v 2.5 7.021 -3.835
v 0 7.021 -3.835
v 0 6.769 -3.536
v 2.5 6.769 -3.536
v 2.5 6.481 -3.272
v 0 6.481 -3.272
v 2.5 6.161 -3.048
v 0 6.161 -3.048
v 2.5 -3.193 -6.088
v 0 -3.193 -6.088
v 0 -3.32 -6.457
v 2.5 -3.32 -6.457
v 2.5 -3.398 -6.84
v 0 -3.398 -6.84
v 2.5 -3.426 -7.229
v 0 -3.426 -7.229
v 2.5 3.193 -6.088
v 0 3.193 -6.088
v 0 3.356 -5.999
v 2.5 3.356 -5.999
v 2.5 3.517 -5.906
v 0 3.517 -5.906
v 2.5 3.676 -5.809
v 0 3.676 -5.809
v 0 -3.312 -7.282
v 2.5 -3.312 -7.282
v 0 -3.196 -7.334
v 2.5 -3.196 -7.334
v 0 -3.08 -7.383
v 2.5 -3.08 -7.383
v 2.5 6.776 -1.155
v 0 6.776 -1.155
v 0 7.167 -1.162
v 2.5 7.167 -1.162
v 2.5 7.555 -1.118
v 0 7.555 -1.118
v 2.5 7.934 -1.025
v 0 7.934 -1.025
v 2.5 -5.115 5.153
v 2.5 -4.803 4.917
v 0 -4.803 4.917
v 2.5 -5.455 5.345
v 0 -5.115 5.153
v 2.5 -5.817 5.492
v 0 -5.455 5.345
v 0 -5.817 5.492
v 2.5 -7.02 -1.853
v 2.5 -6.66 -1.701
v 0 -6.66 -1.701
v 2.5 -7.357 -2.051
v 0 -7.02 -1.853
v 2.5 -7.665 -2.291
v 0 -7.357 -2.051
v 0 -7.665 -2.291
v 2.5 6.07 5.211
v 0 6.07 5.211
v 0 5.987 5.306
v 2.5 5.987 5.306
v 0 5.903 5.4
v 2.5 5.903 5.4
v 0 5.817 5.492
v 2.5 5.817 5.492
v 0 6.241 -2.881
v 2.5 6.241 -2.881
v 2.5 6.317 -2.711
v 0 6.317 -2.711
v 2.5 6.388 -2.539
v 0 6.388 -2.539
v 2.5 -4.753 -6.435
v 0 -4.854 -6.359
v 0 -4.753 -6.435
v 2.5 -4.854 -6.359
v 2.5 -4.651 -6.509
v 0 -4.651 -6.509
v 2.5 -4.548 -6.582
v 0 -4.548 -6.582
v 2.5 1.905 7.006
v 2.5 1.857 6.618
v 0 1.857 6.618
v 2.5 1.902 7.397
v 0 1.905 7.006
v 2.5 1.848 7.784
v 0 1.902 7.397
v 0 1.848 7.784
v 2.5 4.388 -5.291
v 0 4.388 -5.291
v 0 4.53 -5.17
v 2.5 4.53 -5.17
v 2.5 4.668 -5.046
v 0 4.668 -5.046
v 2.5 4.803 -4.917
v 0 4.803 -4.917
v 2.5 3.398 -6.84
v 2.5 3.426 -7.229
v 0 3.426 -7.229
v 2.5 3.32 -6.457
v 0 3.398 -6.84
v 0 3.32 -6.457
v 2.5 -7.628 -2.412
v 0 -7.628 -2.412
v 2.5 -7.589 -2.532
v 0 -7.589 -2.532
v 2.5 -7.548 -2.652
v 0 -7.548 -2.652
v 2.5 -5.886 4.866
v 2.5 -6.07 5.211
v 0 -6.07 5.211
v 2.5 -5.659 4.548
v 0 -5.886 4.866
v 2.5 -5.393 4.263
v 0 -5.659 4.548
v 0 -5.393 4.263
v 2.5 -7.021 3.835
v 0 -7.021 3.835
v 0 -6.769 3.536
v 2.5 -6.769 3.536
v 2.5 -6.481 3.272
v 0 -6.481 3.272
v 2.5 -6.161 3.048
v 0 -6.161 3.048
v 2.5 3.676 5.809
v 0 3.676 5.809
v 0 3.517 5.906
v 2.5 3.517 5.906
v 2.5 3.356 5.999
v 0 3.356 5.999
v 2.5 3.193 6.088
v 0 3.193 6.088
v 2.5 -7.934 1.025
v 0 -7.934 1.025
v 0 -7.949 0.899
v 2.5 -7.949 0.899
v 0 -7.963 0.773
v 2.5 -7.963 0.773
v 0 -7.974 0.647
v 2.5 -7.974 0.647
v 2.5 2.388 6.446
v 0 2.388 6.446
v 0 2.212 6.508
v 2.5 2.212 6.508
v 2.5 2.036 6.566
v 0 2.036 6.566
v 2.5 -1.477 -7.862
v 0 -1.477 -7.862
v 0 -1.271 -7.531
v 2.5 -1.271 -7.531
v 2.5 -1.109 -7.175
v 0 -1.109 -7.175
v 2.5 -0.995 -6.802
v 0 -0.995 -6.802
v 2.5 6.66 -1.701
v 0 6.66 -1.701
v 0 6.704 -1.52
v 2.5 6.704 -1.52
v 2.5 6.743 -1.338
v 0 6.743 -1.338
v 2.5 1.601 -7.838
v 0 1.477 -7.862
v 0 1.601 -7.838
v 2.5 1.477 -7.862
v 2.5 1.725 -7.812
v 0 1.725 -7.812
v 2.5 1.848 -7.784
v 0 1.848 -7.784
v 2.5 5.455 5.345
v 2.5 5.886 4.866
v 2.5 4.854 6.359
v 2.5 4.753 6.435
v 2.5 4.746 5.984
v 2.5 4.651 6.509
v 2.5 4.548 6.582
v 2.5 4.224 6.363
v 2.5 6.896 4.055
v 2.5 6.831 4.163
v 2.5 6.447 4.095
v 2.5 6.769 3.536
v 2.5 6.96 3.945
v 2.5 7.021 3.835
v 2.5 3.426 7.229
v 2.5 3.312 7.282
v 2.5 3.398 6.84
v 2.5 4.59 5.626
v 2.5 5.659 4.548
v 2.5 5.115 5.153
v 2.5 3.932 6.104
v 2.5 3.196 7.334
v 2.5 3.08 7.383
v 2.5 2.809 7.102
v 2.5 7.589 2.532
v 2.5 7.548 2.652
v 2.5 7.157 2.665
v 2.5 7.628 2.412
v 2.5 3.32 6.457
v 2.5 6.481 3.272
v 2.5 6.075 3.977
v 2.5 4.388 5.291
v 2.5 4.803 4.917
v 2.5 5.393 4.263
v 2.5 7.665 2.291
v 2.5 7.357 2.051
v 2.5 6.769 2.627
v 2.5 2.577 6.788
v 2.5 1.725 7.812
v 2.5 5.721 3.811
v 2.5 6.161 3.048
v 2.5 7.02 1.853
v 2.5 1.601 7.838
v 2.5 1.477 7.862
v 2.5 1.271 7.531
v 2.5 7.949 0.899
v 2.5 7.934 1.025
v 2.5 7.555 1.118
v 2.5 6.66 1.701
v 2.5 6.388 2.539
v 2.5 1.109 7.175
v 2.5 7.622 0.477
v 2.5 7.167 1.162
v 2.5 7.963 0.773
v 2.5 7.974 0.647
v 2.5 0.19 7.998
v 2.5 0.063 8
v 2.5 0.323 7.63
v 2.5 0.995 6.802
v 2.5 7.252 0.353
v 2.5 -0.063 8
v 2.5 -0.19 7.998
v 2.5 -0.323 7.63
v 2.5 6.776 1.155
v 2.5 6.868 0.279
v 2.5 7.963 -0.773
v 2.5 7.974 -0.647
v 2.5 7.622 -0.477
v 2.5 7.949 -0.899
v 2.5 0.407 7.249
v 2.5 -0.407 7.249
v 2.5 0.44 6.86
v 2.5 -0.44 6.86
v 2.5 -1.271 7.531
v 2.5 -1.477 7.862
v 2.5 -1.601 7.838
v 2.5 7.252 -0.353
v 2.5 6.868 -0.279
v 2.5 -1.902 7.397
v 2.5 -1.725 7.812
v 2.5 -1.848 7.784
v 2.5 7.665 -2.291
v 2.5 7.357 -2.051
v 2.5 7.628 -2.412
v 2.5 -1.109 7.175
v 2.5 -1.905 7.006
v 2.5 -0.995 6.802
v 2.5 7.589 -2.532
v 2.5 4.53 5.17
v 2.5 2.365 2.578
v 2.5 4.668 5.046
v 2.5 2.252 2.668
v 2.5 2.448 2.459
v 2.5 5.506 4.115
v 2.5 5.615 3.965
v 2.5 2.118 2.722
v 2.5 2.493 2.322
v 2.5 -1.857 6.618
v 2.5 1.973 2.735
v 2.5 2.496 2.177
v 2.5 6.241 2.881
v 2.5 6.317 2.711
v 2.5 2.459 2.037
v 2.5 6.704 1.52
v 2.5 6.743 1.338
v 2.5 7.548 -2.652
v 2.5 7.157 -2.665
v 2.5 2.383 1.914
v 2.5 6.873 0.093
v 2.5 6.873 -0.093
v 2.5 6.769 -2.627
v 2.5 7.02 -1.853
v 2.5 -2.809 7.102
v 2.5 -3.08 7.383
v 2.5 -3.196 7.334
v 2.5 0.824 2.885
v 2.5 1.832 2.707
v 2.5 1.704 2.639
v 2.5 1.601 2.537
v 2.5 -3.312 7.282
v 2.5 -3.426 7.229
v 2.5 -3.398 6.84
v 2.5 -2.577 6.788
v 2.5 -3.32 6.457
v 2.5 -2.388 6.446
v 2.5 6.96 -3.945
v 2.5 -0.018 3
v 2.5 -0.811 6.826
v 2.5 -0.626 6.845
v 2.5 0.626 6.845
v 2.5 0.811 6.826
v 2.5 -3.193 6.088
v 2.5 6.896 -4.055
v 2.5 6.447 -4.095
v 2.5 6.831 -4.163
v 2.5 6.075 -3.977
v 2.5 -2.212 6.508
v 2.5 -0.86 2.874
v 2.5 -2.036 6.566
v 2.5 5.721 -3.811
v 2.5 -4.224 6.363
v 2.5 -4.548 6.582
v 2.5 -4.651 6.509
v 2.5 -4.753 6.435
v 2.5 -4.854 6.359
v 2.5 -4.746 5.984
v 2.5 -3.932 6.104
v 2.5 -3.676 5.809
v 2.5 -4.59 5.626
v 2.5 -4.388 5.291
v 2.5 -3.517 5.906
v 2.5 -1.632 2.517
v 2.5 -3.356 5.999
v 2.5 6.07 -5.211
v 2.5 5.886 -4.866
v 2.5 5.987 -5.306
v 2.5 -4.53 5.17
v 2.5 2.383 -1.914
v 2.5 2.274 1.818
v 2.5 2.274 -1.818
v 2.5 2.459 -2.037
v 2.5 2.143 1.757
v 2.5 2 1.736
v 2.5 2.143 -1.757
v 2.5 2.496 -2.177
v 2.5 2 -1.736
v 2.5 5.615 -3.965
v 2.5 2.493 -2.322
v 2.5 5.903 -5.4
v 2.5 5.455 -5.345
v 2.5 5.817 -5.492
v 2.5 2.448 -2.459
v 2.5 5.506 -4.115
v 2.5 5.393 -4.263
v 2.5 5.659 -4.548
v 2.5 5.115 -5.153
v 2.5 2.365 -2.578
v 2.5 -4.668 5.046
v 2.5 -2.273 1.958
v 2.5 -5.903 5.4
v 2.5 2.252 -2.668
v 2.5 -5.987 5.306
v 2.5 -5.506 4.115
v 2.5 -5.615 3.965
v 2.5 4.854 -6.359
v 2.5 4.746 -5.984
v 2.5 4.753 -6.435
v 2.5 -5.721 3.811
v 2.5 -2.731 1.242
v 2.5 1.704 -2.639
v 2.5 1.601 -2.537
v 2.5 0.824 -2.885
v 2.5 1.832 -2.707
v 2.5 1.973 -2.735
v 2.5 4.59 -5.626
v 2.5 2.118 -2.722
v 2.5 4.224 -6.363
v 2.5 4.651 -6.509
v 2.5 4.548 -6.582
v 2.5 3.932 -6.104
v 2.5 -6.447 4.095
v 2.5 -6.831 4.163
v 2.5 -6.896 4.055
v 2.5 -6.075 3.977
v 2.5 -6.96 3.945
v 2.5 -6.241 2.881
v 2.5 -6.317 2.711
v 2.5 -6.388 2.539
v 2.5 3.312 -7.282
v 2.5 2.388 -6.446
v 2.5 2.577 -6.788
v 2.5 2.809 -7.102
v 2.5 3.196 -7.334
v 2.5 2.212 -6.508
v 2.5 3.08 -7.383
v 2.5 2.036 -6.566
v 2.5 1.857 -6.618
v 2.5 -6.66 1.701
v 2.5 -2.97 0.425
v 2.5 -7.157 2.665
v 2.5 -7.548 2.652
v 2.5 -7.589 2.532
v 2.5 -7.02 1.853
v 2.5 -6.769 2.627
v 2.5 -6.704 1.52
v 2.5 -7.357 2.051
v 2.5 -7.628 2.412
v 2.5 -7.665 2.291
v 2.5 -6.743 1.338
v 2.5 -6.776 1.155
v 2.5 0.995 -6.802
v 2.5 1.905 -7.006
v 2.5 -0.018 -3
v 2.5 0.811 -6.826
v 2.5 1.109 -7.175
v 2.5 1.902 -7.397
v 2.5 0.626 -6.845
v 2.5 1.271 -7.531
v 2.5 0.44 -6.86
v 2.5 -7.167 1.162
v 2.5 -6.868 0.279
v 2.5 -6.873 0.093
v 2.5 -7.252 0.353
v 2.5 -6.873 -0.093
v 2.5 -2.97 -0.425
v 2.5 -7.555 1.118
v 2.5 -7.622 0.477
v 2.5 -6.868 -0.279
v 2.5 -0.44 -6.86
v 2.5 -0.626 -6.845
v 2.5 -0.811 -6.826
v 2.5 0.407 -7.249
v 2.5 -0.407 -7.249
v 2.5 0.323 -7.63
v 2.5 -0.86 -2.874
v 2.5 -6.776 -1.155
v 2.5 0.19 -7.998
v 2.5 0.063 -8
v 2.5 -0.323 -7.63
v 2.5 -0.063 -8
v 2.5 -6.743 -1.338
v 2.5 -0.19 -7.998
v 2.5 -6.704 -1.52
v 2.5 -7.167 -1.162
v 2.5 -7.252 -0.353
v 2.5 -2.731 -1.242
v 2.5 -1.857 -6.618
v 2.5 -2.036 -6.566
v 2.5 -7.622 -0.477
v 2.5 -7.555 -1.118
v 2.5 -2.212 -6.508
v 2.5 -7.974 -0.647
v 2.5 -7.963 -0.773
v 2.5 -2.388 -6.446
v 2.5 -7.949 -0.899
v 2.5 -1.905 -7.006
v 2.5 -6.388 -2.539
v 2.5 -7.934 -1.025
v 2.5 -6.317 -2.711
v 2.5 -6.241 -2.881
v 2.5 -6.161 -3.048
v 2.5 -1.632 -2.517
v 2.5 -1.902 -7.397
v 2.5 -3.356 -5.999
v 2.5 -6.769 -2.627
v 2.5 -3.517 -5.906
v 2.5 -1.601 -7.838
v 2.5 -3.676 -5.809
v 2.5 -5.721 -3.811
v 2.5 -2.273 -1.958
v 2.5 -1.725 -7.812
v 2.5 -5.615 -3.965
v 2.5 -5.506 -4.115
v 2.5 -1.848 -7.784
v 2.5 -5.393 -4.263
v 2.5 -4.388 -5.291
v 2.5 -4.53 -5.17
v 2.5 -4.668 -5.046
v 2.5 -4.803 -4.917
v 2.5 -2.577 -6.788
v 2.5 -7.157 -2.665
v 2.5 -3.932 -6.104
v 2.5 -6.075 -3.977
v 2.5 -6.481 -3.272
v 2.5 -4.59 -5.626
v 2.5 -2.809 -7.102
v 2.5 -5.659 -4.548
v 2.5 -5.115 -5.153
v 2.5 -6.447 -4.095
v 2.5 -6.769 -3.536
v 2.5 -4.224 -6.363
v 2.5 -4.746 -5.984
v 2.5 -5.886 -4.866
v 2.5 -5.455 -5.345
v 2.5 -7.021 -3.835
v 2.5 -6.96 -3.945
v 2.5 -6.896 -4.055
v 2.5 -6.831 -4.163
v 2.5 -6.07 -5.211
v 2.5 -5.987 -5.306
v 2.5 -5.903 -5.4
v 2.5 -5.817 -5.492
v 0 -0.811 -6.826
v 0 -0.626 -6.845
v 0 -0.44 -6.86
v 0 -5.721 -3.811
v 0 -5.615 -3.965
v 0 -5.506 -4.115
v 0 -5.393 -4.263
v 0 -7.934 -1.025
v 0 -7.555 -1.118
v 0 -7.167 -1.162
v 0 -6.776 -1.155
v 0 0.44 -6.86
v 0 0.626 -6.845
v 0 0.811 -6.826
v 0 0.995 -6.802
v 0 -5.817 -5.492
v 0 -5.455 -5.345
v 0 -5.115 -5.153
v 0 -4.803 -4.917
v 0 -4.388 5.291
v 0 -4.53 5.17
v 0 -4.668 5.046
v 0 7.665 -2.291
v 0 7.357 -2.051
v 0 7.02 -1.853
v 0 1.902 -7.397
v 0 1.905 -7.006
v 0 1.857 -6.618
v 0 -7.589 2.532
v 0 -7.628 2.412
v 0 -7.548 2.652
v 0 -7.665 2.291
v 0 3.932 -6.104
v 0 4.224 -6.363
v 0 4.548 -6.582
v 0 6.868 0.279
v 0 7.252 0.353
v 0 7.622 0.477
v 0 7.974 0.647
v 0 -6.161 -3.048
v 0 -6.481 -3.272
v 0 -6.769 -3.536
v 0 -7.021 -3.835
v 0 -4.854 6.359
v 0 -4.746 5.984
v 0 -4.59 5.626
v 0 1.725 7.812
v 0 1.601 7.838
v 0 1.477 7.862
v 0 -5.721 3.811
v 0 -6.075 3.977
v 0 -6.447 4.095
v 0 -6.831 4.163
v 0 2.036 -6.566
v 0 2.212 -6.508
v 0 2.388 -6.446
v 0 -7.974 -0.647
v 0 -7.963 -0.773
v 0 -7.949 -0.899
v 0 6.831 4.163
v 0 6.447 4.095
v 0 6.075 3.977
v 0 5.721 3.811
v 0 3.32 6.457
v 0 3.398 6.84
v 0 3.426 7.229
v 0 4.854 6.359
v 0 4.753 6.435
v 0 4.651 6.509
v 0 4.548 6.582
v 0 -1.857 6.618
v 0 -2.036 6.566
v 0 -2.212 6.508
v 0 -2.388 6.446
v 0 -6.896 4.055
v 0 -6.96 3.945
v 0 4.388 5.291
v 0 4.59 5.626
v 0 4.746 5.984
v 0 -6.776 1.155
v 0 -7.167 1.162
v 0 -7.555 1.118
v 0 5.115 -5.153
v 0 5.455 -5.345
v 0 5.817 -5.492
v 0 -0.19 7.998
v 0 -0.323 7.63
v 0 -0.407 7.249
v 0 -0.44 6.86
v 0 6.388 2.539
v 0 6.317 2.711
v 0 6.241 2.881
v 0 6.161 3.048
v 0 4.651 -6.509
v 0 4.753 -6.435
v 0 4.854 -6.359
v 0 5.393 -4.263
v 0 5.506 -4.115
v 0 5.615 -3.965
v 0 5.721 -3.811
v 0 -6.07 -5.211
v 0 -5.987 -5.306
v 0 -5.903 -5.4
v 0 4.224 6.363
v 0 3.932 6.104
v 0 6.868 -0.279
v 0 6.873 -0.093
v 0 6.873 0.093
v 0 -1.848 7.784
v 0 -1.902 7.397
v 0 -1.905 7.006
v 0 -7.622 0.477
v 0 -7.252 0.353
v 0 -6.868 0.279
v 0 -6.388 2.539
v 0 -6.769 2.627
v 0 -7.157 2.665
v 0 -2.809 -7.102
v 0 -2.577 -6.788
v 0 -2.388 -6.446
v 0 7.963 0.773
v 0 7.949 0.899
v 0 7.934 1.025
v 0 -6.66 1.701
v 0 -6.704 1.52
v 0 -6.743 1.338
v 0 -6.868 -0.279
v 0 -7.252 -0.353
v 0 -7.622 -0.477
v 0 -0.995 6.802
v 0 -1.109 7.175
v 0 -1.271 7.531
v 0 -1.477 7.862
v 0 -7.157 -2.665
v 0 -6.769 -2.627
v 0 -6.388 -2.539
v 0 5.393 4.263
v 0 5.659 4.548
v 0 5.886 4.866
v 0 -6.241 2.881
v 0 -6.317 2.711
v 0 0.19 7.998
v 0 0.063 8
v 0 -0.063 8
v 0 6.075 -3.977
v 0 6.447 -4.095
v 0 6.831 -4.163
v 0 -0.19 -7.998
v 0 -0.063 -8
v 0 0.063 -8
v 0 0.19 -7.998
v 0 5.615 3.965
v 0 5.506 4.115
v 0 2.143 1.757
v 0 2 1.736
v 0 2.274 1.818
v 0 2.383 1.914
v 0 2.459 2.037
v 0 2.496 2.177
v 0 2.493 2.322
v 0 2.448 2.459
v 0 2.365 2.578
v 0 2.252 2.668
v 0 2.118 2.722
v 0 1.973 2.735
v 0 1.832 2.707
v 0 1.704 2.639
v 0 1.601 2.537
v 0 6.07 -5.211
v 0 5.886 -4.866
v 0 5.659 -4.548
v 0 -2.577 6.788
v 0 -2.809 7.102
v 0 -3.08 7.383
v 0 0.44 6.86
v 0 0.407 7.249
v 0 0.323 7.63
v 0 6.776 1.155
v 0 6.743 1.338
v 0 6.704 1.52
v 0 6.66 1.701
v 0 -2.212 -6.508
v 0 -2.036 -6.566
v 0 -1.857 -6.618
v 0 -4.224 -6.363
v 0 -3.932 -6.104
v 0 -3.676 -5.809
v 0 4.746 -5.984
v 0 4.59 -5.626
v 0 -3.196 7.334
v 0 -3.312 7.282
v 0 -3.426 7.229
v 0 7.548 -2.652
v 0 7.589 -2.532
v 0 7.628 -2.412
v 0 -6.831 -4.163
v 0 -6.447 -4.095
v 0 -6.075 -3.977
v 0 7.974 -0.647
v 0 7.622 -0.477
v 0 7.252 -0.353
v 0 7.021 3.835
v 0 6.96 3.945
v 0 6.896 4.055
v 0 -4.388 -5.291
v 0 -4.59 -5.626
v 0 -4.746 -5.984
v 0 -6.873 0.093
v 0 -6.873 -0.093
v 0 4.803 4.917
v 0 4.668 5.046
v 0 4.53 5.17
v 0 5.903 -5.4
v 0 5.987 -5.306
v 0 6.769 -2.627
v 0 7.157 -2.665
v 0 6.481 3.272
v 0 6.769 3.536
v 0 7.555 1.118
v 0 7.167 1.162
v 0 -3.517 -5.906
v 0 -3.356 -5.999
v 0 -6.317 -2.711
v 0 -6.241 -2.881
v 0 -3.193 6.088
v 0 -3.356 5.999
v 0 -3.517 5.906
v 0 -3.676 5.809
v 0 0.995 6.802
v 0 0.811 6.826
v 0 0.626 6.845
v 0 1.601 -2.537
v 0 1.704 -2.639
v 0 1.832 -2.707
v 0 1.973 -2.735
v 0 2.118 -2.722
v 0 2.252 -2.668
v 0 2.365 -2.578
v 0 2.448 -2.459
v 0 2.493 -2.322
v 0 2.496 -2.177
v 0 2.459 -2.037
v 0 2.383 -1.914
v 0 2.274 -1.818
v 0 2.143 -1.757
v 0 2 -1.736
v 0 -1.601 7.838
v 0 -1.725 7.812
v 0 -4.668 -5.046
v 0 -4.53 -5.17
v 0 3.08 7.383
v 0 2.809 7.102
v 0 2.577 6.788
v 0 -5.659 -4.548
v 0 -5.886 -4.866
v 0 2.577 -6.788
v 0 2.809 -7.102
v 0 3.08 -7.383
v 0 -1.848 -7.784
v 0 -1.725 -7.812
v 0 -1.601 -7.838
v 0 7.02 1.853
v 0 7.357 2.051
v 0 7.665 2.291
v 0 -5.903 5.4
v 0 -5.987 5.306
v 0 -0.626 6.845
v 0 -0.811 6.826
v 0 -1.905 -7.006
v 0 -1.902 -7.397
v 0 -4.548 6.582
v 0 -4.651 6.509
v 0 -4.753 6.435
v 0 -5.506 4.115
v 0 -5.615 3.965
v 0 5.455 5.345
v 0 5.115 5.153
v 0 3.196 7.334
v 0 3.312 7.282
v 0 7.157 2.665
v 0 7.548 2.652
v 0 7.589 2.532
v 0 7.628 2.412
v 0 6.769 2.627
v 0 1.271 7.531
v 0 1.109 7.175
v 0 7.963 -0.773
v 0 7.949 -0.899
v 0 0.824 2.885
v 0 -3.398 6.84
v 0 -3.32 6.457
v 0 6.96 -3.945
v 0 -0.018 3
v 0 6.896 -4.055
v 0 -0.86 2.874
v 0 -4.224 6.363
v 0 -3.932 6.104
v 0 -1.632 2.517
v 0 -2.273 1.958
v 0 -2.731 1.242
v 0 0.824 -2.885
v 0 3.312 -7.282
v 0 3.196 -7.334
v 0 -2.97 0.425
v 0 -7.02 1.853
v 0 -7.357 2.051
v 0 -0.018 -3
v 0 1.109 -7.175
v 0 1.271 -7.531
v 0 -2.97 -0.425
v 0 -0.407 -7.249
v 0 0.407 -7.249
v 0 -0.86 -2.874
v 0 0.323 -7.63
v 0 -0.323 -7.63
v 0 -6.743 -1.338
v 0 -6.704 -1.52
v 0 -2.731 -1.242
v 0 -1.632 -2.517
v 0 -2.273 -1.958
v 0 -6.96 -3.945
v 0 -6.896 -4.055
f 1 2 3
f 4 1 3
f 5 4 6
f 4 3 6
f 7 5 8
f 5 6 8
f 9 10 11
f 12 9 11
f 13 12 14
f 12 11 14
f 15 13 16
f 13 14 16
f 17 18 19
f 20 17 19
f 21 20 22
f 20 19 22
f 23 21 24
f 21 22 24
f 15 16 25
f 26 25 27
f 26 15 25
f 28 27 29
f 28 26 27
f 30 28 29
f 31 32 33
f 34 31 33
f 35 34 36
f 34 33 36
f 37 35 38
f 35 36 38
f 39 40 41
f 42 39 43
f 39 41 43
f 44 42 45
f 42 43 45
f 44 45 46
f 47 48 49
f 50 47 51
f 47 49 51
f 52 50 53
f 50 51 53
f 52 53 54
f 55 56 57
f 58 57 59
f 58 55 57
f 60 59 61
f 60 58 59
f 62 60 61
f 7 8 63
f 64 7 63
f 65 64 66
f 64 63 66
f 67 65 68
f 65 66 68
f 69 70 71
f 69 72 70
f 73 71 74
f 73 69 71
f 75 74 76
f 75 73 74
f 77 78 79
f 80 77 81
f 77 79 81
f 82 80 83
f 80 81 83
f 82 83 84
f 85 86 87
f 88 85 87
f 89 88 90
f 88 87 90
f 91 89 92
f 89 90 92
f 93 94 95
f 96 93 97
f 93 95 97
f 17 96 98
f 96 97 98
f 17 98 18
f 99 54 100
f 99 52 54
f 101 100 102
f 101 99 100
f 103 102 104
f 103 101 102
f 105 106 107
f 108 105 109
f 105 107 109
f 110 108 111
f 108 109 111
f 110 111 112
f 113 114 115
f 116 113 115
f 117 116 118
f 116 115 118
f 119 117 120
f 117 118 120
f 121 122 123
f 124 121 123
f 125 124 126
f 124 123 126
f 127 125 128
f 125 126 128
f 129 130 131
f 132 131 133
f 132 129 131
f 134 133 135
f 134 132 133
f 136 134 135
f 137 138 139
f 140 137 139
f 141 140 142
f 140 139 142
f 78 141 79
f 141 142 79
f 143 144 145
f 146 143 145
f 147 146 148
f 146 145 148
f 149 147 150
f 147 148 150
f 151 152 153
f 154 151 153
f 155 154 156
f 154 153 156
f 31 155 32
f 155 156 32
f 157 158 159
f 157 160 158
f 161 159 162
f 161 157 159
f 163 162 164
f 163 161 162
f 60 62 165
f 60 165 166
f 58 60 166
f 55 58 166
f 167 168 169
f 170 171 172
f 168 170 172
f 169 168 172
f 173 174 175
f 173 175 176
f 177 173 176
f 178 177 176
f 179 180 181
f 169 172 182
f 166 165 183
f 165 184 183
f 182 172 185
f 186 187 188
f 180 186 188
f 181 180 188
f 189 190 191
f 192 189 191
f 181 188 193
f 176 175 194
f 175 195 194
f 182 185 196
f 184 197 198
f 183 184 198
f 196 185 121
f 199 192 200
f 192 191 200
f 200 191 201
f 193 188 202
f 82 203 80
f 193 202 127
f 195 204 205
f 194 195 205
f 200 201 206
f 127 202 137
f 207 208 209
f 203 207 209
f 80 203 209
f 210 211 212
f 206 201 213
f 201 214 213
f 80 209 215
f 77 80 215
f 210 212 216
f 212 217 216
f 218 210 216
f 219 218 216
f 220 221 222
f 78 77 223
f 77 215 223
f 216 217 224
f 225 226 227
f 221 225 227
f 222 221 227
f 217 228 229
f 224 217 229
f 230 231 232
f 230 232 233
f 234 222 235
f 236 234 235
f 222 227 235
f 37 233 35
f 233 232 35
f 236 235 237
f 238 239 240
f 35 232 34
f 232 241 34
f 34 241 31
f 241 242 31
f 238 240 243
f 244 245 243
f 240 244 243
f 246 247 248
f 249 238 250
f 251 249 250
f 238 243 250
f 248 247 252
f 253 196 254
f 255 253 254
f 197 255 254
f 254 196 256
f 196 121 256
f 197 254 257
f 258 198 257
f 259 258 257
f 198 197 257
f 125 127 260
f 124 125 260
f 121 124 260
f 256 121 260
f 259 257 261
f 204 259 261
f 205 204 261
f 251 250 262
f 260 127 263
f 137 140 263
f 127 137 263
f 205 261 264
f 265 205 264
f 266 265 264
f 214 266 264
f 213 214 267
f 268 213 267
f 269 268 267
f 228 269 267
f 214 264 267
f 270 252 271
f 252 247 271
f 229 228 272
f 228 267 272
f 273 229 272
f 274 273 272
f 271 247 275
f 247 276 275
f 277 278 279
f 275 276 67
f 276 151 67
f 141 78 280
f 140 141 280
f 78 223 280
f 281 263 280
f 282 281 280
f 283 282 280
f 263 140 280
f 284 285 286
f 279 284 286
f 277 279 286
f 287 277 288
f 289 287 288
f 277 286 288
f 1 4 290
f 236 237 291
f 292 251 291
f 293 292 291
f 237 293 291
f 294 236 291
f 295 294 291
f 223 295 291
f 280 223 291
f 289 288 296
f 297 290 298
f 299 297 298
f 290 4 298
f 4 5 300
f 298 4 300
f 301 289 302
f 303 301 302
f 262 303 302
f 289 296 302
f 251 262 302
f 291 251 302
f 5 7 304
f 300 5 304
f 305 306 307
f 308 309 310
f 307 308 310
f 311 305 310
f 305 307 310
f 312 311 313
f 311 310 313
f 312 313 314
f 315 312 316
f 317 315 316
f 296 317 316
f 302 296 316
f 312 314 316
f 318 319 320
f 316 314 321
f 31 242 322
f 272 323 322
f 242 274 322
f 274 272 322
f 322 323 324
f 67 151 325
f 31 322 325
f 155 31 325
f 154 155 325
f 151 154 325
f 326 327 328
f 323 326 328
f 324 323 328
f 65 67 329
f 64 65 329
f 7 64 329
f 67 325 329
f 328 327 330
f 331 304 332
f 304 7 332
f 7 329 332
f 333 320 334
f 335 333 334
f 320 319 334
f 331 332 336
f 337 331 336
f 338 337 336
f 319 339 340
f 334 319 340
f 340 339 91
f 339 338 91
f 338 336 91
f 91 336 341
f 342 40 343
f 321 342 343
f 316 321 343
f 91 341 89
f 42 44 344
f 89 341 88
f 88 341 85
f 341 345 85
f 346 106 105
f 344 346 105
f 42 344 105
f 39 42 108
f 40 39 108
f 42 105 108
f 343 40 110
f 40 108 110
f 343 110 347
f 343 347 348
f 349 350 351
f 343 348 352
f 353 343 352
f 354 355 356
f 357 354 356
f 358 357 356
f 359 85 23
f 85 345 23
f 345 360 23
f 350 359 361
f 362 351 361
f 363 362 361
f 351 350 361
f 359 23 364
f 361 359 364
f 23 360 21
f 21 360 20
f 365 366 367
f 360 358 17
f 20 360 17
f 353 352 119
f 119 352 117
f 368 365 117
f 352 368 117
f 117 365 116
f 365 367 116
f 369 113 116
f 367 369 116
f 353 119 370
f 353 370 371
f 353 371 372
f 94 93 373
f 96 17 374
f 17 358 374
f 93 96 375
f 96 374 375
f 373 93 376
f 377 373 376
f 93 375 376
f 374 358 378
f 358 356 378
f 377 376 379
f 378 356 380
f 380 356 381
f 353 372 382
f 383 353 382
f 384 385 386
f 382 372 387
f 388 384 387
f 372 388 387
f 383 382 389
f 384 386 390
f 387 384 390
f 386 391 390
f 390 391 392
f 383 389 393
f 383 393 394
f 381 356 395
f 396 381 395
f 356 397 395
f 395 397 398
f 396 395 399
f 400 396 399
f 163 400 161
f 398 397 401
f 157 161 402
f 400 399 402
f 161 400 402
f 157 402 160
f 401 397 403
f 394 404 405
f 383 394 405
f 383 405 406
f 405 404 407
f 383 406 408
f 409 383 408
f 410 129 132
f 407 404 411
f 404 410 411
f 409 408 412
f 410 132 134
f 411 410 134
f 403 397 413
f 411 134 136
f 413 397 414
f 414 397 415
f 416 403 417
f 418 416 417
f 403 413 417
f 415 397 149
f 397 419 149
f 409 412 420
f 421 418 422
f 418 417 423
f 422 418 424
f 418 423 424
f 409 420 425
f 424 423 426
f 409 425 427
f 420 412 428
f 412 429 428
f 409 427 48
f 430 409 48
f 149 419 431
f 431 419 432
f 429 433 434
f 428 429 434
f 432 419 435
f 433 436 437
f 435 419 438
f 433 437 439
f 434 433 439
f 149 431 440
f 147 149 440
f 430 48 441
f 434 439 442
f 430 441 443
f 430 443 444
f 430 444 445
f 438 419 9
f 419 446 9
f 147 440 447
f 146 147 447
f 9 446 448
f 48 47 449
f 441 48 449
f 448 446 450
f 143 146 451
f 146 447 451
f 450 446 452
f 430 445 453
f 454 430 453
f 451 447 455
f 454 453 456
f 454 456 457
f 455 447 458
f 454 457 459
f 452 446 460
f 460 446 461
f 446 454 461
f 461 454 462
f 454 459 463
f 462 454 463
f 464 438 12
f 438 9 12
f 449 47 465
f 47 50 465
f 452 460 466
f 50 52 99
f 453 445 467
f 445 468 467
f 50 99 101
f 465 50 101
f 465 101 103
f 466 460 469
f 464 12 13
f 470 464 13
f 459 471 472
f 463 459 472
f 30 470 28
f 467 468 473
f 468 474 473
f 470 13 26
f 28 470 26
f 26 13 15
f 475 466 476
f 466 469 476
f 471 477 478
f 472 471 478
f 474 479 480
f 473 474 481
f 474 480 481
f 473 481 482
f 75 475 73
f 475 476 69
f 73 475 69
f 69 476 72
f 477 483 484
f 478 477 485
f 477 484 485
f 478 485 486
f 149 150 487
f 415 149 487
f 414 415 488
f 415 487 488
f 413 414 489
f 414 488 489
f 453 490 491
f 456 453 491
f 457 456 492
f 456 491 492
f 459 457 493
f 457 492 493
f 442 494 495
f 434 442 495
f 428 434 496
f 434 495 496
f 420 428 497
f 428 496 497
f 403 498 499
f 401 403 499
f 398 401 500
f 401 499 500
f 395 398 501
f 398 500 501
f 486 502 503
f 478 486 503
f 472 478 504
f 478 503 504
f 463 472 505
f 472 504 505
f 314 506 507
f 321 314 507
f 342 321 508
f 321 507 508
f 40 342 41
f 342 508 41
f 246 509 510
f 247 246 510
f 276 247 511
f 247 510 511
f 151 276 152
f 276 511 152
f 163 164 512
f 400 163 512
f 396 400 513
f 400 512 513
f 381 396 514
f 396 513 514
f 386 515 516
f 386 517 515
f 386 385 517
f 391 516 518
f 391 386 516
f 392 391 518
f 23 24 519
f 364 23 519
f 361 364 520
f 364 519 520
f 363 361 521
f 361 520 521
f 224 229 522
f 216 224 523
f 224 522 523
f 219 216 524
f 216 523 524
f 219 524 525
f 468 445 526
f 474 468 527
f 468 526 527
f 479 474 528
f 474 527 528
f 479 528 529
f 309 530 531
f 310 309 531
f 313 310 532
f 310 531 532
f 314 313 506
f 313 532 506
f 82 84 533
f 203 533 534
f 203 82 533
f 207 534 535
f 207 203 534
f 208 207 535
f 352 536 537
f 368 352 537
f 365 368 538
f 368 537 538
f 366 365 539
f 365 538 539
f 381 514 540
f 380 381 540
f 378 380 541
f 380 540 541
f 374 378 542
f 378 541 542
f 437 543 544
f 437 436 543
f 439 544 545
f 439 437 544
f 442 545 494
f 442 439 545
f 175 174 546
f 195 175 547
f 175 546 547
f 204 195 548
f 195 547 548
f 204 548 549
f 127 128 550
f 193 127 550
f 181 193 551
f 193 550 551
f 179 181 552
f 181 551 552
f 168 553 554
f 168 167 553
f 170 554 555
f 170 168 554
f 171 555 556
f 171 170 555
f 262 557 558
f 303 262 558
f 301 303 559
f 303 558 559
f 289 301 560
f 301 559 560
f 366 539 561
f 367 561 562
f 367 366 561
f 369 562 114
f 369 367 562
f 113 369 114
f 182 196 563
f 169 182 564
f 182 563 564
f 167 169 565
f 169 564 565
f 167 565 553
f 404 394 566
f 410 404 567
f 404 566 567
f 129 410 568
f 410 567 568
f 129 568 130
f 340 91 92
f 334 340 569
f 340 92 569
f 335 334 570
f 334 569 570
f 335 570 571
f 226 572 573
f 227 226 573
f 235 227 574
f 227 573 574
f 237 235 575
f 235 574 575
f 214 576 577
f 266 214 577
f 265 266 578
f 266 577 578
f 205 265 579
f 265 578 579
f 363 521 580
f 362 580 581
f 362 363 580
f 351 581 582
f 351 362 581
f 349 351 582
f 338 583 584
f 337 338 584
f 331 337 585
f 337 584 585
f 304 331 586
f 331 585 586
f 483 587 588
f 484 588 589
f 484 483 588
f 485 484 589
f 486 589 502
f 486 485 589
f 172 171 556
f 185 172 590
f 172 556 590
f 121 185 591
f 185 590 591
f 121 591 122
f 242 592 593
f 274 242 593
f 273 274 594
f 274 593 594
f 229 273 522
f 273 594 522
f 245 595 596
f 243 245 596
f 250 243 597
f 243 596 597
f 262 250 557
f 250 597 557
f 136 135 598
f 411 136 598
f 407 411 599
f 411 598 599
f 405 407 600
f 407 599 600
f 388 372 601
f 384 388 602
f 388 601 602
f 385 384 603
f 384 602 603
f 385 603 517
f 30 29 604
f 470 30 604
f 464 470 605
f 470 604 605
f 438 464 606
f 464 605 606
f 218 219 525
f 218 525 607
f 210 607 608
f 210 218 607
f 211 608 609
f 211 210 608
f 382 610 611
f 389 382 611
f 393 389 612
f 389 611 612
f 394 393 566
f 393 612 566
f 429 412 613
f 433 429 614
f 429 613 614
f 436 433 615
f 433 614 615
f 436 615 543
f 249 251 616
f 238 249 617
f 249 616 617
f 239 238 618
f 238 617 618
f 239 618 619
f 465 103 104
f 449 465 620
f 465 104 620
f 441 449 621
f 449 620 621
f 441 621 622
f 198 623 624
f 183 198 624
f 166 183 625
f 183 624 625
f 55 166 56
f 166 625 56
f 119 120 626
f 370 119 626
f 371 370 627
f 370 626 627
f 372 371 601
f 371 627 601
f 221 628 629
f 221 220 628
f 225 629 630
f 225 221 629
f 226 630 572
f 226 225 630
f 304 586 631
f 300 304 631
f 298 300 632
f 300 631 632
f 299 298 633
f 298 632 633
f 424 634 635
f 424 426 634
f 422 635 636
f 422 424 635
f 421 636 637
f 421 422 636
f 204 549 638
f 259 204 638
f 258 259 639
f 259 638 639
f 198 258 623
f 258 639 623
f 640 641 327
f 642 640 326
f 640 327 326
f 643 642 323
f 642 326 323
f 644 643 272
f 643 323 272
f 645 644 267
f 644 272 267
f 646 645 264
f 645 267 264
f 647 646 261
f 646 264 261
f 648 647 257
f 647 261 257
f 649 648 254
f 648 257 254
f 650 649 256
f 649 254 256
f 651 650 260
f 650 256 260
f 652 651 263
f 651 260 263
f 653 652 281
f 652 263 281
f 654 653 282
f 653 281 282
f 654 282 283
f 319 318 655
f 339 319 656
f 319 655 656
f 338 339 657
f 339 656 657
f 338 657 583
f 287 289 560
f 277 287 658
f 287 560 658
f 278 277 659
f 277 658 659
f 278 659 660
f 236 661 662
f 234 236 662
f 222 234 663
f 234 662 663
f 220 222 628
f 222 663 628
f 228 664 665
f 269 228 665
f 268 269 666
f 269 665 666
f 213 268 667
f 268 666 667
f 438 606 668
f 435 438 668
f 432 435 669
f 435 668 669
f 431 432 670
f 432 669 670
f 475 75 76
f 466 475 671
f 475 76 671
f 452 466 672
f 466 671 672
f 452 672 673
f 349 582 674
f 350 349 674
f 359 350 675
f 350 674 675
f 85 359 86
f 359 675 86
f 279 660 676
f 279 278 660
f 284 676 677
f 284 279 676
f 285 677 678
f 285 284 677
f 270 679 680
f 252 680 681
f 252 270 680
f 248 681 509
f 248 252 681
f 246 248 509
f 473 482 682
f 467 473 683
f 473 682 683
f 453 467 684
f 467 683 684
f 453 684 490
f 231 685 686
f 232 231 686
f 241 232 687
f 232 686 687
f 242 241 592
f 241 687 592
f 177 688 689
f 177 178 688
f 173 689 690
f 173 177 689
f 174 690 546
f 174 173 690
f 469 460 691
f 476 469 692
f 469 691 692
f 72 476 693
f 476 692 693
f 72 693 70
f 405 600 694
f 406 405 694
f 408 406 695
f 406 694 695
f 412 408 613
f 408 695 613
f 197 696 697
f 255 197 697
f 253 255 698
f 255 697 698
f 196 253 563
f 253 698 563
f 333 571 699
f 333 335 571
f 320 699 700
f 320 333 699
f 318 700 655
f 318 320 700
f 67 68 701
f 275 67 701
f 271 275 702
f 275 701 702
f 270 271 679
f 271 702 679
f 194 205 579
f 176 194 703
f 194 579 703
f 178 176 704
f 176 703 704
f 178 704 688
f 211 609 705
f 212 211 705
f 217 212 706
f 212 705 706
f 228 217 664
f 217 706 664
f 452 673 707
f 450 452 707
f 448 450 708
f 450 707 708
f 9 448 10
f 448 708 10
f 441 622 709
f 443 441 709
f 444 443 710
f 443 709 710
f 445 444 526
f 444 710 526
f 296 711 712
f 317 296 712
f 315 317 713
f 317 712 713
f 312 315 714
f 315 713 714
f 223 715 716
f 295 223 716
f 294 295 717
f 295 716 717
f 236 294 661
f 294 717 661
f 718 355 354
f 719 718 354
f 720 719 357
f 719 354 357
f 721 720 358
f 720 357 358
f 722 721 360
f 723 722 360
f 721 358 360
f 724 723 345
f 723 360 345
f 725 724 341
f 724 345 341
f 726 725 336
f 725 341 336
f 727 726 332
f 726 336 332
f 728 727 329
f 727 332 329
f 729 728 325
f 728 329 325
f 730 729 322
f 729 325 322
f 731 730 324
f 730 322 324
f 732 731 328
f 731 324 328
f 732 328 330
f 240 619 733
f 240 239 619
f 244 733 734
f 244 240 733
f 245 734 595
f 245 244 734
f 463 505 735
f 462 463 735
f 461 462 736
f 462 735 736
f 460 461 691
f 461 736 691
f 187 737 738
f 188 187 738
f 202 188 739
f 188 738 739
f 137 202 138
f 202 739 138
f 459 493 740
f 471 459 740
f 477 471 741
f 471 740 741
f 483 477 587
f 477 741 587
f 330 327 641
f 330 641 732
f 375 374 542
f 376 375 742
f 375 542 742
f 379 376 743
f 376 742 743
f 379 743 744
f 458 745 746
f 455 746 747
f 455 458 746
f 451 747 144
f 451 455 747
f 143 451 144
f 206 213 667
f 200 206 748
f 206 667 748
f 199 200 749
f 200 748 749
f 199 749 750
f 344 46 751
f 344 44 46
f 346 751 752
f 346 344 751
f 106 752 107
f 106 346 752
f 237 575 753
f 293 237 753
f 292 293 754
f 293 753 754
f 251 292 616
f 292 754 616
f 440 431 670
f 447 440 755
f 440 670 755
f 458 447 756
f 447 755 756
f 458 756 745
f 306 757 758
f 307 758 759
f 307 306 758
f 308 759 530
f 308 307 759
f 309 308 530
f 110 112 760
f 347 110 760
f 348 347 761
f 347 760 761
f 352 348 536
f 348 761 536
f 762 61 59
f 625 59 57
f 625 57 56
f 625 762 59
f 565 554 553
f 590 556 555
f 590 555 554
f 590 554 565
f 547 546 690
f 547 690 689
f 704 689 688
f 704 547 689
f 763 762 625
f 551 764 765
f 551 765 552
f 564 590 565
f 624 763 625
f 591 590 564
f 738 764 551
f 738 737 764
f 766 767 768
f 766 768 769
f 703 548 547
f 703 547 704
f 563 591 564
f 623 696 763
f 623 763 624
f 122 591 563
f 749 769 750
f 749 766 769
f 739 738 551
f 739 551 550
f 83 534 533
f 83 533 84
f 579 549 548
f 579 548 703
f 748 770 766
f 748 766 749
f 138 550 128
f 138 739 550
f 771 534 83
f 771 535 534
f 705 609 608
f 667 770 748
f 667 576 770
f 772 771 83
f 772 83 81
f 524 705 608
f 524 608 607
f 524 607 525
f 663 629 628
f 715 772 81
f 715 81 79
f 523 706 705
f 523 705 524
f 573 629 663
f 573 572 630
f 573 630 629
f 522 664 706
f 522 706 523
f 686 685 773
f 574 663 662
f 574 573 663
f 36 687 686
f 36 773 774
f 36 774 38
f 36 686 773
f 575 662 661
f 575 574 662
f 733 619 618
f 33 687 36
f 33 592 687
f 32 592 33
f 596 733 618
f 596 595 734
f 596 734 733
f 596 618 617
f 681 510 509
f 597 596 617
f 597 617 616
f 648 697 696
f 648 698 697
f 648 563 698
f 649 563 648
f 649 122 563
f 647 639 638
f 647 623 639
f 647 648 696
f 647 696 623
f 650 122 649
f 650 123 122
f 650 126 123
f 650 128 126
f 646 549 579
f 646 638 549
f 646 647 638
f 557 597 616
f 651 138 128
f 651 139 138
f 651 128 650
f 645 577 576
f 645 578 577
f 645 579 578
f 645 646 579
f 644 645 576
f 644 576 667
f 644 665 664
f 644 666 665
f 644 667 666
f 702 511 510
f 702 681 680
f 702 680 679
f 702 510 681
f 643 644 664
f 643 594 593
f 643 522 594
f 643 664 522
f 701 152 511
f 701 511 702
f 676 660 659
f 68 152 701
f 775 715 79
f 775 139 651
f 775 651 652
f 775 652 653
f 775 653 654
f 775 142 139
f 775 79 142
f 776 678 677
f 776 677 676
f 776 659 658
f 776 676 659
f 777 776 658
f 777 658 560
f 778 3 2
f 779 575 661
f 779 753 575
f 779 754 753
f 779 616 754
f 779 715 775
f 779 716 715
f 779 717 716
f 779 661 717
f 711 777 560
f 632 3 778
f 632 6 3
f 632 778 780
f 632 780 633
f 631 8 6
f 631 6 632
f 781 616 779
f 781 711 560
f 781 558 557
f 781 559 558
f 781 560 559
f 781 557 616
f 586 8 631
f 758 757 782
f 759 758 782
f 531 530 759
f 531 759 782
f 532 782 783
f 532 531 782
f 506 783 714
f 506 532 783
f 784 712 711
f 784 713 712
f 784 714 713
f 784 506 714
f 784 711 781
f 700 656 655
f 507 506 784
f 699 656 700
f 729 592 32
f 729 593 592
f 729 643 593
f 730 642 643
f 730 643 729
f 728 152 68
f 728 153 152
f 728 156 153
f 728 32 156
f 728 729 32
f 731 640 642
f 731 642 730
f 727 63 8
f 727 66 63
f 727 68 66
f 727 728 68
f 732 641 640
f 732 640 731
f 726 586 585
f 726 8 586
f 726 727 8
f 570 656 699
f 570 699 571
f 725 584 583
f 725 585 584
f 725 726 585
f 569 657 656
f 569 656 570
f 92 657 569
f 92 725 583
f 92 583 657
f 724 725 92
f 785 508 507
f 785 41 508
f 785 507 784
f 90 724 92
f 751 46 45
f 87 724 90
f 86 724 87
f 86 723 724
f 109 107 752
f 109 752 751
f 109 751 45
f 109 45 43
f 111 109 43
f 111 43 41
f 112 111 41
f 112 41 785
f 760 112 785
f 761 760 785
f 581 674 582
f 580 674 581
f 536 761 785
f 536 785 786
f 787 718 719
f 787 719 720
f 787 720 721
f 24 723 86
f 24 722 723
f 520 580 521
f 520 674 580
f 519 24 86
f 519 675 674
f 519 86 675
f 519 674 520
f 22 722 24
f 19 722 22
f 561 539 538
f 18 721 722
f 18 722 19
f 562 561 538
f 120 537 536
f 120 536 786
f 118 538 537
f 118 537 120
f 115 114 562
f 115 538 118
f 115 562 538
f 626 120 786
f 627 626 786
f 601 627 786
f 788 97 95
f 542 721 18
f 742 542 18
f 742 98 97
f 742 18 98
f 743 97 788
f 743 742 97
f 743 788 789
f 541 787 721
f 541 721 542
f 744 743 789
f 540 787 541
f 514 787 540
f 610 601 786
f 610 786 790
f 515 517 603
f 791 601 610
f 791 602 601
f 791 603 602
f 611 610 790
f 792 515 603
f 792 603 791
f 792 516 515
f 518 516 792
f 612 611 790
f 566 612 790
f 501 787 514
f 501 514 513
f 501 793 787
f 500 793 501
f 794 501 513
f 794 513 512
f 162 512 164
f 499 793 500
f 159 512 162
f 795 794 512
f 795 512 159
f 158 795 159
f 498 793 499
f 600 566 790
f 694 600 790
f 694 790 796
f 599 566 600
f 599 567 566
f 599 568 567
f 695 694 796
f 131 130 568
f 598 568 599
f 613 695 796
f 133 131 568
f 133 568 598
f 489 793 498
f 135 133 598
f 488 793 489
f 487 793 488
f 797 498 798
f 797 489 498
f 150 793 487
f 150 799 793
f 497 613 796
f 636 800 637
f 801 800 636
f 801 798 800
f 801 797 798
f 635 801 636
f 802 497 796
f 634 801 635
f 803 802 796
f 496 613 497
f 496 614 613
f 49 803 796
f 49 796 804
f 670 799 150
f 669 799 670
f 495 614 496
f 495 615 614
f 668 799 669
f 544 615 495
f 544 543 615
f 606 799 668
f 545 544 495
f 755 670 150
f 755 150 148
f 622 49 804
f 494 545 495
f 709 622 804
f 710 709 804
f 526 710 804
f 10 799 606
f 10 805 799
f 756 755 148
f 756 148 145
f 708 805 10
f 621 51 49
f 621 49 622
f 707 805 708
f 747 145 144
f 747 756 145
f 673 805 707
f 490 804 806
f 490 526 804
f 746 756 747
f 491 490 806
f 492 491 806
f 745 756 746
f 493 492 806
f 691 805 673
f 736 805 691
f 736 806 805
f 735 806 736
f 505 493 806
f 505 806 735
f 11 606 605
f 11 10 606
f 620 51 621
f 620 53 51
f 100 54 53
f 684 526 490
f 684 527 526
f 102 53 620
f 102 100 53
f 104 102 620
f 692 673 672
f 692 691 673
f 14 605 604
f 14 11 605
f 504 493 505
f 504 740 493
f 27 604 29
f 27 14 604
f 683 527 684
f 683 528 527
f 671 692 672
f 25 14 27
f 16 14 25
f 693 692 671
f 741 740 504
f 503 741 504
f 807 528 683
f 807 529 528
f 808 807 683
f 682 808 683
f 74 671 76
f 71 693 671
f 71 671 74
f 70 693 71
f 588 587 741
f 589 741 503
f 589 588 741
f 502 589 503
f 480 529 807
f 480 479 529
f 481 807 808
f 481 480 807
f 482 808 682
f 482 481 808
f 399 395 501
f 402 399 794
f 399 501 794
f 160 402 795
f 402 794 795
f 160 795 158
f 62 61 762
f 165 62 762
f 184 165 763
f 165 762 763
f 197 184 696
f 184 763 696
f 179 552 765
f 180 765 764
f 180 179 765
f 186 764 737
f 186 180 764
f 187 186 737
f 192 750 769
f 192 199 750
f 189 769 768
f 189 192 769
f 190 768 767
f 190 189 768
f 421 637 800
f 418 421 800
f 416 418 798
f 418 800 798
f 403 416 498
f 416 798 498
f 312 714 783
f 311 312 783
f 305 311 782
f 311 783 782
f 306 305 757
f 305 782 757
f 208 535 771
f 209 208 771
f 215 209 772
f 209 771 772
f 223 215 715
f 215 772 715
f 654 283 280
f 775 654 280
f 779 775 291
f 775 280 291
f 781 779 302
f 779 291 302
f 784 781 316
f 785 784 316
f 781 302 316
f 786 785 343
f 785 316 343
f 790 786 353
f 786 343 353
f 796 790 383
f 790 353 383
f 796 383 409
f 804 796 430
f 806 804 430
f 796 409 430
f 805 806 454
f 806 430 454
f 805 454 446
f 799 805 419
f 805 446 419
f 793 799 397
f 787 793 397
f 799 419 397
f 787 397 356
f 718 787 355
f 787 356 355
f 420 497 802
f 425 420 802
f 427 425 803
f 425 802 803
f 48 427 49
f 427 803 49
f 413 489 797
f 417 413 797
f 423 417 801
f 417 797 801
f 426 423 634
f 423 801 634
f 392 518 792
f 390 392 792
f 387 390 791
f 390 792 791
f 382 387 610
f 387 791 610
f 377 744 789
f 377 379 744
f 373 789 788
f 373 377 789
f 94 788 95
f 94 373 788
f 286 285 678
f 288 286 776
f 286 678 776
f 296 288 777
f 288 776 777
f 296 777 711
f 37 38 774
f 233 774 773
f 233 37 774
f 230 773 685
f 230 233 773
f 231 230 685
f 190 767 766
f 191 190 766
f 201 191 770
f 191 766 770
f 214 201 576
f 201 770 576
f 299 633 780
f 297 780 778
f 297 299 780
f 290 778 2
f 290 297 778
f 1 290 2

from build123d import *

# Parameters (mm, degrees)
BASPROSKE_W         = 2.5
BASPROSKE_H         = 8
TOOTHCUT_DEPTH      = 12.586630226
TEETHCUTS_COUNT     = 30
TEETHCUTS_ANGLE     = 348
BORSKE_R            = 3
BORE_DEPTH          = 50.0000508
EXTRUDE_1_DEPTH     = 2.5
SKETCH_2_R          = 0.5
CUT_EXTRUDE_1_DEPTH = 12.568528524


with BuildPart() as part:
    # BasProSke → Base-Revolve (revolve)
    with BuildSketch(Plane(origin=(0, 0, 0), x_dir=(1, 0, 0), z_dir=(0, 1, 0)), mode=Mode.PRIVATE) as base_revolve_sk:
        with Locations((1.25, 4)):
            Rectangle(BASPROSKE_W, BASPROSKE_H)
    revolve(base_revolve_sk.sketch.rotate(Axis((-10, 0, 0), (1, 0, 0)), 180), axis=Axis((-10, 0, 0), (1, 0, 0)))

    # TooCutSke → ToothCut (cut, through all)
    with BuildSketch(Plane(origin=(0, 0, 0), x_dir=(0, 0, -1), z_dir=(1, 0, 0))):
        with BuildLine():
            ThreePointArc((0.279013782, 6.868335119), (0, 6.874), (-0.279013782, 6.868335119))
            ThreePointArc((-0.279013782, 6.868335119), (-0.413500328, 7.452412324), (-0.661410108, 7.998098638))
            ThreePointArc((-0.661410108, 7.998098638), (0, 8.0254), (0.661410108, 7.998098638))
            ThreePointArc((0.661410108, 7.998098638), (0.413500328, 7.452412324), (0.279013782, 6.868335119))
        make_face()
    toothcut = extrude(amount=TOOTHCUT_DEPTH, mode=Mode.SUBTRACT)

    # TeethCuts: ToothCut ×30 about axis
    teethcuts_axis = Axis((-10, 0, 0), (1, 0, 0))
    for i in range(1, TEETHCUTS_COUNT):
        add(toothcut.rotate(teethcuts_axis, i * TEETHCUTS_ANGLE / (TEETHCUTS_COUNT - 1)), mode=Mode.SUBTRACT)

    # BorSke → Bore (cut, symmetric)
    with BuildSketch(Plane(origin=(0, 0, 0), x_dir=(0, 0, -1), z_dir=(1, 0, 0))):
        with Locations(Location((0, 0, 0), (0, 0, 180))):
            Circle(BORSKE_R)
    extrude(amount=BORE_DEPTH, both=True, mode=Mode.SUBTRACT)

    # 草图1 → 凸台-拉伸1 (add, through all)
    with BuildSketch(Plane(origin=(2.5, 0, 0), x_dir=(0, 0, -1), z_dir=(1, 0, 0))):
        with BuildLine():
            Line((-2.236067977, 2), (2.236067977, 2))
            ThreePointArc((2.236067977, 2), (0, 3), (-2.236067977, 2))
        make_face()
    extrude(amount=-EXTRUDE_1_DEPTH)

    # 草图2 → 切除-拉伸1 (cut, through all)
    with BuildSketch(Plane(origin=(2.5, 0, 0), x_dir=(0, 0, -1), z_dir=(1, 0, 0))):
        with Locations((2.236067977, 2)):
            Circle(SKETCH_2_R)
        with Locations((-2.236067977, 2)):
            Circle(SKETCH_2_R)
    extrude(amount=-CUT_EXTRUDE_1_DEPTH, mode=Mode.SUBTRACT)


solid = part.part
